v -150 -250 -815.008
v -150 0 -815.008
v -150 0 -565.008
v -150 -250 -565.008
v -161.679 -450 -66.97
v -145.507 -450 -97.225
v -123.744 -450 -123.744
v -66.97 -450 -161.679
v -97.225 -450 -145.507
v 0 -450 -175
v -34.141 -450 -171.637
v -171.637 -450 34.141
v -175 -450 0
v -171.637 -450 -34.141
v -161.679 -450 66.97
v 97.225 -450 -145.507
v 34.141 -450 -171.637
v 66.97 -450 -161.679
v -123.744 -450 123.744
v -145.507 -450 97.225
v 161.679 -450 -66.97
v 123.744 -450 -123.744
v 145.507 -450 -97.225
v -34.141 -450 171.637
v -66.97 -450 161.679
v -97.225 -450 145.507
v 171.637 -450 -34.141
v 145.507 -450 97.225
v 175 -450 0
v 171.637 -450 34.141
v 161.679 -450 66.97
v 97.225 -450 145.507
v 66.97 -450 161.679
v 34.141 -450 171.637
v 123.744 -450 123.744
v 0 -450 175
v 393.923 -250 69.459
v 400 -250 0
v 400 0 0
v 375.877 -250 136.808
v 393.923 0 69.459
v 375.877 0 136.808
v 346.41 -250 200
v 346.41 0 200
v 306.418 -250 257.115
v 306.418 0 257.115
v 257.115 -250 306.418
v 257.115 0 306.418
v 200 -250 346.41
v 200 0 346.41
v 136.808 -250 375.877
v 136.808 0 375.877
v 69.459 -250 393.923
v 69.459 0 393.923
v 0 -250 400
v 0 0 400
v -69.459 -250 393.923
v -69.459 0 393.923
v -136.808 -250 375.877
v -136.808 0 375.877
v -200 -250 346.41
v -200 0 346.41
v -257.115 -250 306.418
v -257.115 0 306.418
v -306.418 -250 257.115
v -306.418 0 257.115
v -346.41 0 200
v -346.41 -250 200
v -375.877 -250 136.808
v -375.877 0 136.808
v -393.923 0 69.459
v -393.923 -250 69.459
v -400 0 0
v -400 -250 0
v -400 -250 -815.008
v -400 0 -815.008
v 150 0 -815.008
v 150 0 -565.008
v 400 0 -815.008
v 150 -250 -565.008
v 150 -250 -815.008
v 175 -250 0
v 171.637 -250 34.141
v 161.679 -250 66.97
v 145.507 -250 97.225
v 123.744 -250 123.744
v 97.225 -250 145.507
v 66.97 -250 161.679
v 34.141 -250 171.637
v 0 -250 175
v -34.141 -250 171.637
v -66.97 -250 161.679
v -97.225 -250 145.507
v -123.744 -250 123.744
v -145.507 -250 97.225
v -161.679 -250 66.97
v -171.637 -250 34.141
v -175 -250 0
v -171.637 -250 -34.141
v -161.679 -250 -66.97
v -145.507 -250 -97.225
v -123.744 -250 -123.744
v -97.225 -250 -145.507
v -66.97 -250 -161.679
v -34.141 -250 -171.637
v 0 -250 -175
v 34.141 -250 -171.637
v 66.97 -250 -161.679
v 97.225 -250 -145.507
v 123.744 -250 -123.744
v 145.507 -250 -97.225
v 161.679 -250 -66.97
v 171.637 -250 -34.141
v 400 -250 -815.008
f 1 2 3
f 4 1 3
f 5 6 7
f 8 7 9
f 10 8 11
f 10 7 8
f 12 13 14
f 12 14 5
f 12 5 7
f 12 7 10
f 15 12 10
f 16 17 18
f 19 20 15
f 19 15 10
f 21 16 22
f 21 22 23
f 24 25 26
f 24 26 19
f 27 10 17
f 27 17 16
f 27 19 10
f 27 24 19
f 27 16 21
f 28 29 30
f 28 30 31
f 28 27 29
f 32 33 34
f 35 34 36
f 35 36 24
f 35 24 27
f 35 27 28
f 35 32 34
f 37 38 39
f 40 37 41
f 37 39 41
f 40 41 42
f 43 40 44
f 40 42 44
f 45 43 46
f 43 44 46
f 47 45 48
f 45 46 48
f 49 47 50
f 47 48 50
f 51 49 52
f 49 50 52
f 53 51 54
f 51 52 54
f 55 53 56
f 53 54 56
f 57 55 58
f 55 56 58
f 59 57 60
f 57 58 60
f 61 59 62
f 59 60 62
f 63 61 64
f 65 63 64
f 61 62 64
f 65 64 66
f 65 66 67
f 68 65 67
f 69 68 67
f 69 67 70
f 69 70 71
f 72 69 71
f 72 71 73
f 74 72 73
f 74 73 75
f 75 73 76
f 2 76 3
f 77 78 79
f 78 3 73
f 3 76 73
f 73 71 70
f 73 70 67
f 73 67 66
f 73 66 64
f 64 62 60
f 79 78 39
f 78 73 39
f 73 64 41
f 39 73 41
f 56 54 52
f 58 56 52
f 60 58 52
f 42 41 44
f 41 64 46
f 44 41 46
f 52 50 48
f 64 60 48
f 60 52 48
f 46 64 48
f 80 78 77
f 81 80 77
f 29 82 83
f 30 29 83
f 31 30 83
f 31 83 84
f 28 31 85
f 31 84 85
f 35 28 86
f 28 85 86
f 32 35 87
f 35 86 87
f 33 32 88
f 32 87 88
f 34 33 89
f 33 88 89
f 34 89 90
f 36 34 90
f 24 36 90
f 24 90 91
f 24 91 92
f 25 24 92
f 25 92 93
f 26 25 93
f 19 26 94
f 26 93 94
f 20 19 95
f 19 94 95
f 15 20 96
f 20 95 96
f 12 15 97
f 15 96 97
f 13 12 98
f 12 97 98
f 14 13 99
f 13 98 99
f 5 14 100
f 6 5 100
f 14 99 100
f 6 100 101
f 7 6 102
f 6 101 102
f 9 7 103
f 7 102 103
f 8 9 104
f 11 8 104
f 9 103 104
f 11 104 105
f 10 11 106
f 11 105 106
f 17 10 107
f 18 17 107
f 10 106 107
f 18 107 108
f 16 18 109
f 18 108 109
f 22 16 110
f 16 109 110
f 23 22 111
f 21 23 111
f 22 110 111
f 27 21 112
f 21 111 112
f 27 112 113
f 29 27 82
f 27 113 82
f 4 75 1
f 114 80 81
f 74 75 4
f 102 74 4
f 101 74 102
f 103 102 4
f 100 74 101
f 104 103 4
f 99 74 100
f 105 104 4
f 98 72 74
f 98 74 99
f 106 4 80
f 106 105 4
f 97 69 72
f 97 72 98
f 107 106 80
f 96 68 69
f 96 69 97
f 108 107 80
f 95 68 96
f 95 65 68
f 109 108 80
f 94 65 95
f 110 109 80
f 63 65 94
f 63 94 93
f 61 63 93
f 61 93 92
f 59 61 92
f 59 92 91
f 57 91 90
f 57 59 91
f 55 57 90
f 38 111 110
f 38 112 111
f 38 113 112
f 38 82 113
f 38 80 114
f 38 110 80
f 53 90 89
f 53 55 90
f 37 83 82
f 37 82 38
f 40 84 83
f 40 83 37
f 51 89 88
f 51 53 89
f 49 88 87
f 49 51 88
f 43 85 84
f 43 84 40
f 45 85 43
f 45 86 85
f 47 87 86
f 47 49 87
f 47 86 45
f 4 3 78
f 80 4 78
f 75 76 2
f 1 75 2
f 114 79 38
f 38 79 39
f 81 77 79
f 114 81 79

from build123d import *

# Parameters (mm, degrees)
F1_DEPTH = 250
F2_R     = 175
F3_DEPTH = 200
F4_R     = 175
F5_DEPTH = 200


with BuildPart() as f1:
    # F0 (on Front) → F1 (new body)
    with BuildSketch(Plane.XZ):
        with BuildLine():
            Line((400, -815.00775), (400, 0))
            ThreePointArc((400, 0), (0, 400), (-400, 0))
            Line((-400, 0), (-400, -815.00775))
            Line((-400, -815.00775), (-150, -815.00775))
            Line((-150, -815.00775), (-150, -565.00775))
            Line((-150, -565.00775), (150, -565.00775))
            Line((150, -565.00775), (150, -815.00775))
            Line((150, -815.00775), (400, -815.00775))
        make_face()
    extrude(amount=F1_DEPTH)

    # F2 (on face) → F3 (join)
    with BuildSketch(Plane(origin=(0, 0, 0), x_dir=(-1, 0, 0), z_dir=(0, 1, 0))):
        Circle(F2_R)
    extrude(amount=-F3_DEPTH)

    # F4 (on face) → F5 (join)
    with BuildSketch(Plane.XZ.offset(250)):
        Circle(F4_R)
    extrude(amount=F5_DEPTH)


solid = f1.part
